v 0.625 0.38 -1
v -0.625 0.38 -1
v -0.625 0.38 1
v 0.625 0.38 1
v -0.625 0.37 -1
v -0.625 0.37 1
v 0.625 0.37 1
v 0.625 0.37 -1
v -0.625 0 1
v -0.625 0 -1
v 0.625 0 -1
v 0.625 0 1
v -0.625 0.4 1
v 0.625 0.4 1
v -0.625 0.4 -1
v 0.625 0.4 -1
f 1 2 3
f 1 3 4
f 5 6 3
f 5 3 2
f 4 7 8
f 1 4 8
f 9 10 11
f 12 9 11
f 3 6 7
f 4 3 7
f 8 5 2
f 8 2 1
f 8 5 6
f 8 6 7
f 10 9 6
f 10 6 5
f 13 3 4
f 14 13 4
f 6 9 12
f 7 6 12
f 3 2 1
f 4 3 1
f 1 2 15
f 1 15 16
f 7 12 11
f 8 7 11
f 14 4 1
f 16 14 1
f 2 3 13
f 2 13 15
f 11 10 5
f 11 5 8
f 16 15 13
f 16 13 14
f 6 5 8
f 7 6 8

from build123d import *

# Parameters (mm, degrees)
SKETCH1_W           = 1.25
SKETCH1_H           = 2
BOSS_EXTRUDE1_DEPTH = 0.37
SKETCH2_W           = 1.25
SKETCH2_H           = 2
BOSS_EXTRUDE2_DEPTH = 0.01
SKETCH3_W           = 1.25
SKETCH3_H           = 2
BOSS_EXTRUDE3_DEPTH = 0.02


with BuildPart() as part:
    # Sketch1 → Boss-Extrude1 (new body)
    with BuildSketch(Plane(origin=(0, 0, 0), x_dir=(1, 0, 0), z_dir=(0, 1, 0))):
        Rectangle(SKETCH1_W, SKETCH1_H)
    extrude(amount=BOSS_EXTRUDE1_DEPTH)


with BuildPart() as body_2:
    # Sketch2 → Boss-Extrude2 (new body)
    with BuildSketch(Plane(origin=(0, 0.37, 0), x_dir=(1, 0, 0), z_dir=(0, 1, 0))):
        Rectangle(SKETCH2_W, SKETCH2_H)
    extrude(amount=BOSS_EXTRUDE2_DEPTH)


with BuildPart() as body_3:
    # Sketch3 → Boss-Extrude3 (new body)
    with BuildSketch(Plane(origin=(0, 0.38, 0), x_dir=(1, 0, 0), z_dir=(0, 1, 0))):
        Rectangle(SKETCH3_W, SKETCH3_H)
    extrude(amount=BOSS_EXTRUDE3_DEPTH)


solid = Compound([part.part, body_2.part, body_3.part])
